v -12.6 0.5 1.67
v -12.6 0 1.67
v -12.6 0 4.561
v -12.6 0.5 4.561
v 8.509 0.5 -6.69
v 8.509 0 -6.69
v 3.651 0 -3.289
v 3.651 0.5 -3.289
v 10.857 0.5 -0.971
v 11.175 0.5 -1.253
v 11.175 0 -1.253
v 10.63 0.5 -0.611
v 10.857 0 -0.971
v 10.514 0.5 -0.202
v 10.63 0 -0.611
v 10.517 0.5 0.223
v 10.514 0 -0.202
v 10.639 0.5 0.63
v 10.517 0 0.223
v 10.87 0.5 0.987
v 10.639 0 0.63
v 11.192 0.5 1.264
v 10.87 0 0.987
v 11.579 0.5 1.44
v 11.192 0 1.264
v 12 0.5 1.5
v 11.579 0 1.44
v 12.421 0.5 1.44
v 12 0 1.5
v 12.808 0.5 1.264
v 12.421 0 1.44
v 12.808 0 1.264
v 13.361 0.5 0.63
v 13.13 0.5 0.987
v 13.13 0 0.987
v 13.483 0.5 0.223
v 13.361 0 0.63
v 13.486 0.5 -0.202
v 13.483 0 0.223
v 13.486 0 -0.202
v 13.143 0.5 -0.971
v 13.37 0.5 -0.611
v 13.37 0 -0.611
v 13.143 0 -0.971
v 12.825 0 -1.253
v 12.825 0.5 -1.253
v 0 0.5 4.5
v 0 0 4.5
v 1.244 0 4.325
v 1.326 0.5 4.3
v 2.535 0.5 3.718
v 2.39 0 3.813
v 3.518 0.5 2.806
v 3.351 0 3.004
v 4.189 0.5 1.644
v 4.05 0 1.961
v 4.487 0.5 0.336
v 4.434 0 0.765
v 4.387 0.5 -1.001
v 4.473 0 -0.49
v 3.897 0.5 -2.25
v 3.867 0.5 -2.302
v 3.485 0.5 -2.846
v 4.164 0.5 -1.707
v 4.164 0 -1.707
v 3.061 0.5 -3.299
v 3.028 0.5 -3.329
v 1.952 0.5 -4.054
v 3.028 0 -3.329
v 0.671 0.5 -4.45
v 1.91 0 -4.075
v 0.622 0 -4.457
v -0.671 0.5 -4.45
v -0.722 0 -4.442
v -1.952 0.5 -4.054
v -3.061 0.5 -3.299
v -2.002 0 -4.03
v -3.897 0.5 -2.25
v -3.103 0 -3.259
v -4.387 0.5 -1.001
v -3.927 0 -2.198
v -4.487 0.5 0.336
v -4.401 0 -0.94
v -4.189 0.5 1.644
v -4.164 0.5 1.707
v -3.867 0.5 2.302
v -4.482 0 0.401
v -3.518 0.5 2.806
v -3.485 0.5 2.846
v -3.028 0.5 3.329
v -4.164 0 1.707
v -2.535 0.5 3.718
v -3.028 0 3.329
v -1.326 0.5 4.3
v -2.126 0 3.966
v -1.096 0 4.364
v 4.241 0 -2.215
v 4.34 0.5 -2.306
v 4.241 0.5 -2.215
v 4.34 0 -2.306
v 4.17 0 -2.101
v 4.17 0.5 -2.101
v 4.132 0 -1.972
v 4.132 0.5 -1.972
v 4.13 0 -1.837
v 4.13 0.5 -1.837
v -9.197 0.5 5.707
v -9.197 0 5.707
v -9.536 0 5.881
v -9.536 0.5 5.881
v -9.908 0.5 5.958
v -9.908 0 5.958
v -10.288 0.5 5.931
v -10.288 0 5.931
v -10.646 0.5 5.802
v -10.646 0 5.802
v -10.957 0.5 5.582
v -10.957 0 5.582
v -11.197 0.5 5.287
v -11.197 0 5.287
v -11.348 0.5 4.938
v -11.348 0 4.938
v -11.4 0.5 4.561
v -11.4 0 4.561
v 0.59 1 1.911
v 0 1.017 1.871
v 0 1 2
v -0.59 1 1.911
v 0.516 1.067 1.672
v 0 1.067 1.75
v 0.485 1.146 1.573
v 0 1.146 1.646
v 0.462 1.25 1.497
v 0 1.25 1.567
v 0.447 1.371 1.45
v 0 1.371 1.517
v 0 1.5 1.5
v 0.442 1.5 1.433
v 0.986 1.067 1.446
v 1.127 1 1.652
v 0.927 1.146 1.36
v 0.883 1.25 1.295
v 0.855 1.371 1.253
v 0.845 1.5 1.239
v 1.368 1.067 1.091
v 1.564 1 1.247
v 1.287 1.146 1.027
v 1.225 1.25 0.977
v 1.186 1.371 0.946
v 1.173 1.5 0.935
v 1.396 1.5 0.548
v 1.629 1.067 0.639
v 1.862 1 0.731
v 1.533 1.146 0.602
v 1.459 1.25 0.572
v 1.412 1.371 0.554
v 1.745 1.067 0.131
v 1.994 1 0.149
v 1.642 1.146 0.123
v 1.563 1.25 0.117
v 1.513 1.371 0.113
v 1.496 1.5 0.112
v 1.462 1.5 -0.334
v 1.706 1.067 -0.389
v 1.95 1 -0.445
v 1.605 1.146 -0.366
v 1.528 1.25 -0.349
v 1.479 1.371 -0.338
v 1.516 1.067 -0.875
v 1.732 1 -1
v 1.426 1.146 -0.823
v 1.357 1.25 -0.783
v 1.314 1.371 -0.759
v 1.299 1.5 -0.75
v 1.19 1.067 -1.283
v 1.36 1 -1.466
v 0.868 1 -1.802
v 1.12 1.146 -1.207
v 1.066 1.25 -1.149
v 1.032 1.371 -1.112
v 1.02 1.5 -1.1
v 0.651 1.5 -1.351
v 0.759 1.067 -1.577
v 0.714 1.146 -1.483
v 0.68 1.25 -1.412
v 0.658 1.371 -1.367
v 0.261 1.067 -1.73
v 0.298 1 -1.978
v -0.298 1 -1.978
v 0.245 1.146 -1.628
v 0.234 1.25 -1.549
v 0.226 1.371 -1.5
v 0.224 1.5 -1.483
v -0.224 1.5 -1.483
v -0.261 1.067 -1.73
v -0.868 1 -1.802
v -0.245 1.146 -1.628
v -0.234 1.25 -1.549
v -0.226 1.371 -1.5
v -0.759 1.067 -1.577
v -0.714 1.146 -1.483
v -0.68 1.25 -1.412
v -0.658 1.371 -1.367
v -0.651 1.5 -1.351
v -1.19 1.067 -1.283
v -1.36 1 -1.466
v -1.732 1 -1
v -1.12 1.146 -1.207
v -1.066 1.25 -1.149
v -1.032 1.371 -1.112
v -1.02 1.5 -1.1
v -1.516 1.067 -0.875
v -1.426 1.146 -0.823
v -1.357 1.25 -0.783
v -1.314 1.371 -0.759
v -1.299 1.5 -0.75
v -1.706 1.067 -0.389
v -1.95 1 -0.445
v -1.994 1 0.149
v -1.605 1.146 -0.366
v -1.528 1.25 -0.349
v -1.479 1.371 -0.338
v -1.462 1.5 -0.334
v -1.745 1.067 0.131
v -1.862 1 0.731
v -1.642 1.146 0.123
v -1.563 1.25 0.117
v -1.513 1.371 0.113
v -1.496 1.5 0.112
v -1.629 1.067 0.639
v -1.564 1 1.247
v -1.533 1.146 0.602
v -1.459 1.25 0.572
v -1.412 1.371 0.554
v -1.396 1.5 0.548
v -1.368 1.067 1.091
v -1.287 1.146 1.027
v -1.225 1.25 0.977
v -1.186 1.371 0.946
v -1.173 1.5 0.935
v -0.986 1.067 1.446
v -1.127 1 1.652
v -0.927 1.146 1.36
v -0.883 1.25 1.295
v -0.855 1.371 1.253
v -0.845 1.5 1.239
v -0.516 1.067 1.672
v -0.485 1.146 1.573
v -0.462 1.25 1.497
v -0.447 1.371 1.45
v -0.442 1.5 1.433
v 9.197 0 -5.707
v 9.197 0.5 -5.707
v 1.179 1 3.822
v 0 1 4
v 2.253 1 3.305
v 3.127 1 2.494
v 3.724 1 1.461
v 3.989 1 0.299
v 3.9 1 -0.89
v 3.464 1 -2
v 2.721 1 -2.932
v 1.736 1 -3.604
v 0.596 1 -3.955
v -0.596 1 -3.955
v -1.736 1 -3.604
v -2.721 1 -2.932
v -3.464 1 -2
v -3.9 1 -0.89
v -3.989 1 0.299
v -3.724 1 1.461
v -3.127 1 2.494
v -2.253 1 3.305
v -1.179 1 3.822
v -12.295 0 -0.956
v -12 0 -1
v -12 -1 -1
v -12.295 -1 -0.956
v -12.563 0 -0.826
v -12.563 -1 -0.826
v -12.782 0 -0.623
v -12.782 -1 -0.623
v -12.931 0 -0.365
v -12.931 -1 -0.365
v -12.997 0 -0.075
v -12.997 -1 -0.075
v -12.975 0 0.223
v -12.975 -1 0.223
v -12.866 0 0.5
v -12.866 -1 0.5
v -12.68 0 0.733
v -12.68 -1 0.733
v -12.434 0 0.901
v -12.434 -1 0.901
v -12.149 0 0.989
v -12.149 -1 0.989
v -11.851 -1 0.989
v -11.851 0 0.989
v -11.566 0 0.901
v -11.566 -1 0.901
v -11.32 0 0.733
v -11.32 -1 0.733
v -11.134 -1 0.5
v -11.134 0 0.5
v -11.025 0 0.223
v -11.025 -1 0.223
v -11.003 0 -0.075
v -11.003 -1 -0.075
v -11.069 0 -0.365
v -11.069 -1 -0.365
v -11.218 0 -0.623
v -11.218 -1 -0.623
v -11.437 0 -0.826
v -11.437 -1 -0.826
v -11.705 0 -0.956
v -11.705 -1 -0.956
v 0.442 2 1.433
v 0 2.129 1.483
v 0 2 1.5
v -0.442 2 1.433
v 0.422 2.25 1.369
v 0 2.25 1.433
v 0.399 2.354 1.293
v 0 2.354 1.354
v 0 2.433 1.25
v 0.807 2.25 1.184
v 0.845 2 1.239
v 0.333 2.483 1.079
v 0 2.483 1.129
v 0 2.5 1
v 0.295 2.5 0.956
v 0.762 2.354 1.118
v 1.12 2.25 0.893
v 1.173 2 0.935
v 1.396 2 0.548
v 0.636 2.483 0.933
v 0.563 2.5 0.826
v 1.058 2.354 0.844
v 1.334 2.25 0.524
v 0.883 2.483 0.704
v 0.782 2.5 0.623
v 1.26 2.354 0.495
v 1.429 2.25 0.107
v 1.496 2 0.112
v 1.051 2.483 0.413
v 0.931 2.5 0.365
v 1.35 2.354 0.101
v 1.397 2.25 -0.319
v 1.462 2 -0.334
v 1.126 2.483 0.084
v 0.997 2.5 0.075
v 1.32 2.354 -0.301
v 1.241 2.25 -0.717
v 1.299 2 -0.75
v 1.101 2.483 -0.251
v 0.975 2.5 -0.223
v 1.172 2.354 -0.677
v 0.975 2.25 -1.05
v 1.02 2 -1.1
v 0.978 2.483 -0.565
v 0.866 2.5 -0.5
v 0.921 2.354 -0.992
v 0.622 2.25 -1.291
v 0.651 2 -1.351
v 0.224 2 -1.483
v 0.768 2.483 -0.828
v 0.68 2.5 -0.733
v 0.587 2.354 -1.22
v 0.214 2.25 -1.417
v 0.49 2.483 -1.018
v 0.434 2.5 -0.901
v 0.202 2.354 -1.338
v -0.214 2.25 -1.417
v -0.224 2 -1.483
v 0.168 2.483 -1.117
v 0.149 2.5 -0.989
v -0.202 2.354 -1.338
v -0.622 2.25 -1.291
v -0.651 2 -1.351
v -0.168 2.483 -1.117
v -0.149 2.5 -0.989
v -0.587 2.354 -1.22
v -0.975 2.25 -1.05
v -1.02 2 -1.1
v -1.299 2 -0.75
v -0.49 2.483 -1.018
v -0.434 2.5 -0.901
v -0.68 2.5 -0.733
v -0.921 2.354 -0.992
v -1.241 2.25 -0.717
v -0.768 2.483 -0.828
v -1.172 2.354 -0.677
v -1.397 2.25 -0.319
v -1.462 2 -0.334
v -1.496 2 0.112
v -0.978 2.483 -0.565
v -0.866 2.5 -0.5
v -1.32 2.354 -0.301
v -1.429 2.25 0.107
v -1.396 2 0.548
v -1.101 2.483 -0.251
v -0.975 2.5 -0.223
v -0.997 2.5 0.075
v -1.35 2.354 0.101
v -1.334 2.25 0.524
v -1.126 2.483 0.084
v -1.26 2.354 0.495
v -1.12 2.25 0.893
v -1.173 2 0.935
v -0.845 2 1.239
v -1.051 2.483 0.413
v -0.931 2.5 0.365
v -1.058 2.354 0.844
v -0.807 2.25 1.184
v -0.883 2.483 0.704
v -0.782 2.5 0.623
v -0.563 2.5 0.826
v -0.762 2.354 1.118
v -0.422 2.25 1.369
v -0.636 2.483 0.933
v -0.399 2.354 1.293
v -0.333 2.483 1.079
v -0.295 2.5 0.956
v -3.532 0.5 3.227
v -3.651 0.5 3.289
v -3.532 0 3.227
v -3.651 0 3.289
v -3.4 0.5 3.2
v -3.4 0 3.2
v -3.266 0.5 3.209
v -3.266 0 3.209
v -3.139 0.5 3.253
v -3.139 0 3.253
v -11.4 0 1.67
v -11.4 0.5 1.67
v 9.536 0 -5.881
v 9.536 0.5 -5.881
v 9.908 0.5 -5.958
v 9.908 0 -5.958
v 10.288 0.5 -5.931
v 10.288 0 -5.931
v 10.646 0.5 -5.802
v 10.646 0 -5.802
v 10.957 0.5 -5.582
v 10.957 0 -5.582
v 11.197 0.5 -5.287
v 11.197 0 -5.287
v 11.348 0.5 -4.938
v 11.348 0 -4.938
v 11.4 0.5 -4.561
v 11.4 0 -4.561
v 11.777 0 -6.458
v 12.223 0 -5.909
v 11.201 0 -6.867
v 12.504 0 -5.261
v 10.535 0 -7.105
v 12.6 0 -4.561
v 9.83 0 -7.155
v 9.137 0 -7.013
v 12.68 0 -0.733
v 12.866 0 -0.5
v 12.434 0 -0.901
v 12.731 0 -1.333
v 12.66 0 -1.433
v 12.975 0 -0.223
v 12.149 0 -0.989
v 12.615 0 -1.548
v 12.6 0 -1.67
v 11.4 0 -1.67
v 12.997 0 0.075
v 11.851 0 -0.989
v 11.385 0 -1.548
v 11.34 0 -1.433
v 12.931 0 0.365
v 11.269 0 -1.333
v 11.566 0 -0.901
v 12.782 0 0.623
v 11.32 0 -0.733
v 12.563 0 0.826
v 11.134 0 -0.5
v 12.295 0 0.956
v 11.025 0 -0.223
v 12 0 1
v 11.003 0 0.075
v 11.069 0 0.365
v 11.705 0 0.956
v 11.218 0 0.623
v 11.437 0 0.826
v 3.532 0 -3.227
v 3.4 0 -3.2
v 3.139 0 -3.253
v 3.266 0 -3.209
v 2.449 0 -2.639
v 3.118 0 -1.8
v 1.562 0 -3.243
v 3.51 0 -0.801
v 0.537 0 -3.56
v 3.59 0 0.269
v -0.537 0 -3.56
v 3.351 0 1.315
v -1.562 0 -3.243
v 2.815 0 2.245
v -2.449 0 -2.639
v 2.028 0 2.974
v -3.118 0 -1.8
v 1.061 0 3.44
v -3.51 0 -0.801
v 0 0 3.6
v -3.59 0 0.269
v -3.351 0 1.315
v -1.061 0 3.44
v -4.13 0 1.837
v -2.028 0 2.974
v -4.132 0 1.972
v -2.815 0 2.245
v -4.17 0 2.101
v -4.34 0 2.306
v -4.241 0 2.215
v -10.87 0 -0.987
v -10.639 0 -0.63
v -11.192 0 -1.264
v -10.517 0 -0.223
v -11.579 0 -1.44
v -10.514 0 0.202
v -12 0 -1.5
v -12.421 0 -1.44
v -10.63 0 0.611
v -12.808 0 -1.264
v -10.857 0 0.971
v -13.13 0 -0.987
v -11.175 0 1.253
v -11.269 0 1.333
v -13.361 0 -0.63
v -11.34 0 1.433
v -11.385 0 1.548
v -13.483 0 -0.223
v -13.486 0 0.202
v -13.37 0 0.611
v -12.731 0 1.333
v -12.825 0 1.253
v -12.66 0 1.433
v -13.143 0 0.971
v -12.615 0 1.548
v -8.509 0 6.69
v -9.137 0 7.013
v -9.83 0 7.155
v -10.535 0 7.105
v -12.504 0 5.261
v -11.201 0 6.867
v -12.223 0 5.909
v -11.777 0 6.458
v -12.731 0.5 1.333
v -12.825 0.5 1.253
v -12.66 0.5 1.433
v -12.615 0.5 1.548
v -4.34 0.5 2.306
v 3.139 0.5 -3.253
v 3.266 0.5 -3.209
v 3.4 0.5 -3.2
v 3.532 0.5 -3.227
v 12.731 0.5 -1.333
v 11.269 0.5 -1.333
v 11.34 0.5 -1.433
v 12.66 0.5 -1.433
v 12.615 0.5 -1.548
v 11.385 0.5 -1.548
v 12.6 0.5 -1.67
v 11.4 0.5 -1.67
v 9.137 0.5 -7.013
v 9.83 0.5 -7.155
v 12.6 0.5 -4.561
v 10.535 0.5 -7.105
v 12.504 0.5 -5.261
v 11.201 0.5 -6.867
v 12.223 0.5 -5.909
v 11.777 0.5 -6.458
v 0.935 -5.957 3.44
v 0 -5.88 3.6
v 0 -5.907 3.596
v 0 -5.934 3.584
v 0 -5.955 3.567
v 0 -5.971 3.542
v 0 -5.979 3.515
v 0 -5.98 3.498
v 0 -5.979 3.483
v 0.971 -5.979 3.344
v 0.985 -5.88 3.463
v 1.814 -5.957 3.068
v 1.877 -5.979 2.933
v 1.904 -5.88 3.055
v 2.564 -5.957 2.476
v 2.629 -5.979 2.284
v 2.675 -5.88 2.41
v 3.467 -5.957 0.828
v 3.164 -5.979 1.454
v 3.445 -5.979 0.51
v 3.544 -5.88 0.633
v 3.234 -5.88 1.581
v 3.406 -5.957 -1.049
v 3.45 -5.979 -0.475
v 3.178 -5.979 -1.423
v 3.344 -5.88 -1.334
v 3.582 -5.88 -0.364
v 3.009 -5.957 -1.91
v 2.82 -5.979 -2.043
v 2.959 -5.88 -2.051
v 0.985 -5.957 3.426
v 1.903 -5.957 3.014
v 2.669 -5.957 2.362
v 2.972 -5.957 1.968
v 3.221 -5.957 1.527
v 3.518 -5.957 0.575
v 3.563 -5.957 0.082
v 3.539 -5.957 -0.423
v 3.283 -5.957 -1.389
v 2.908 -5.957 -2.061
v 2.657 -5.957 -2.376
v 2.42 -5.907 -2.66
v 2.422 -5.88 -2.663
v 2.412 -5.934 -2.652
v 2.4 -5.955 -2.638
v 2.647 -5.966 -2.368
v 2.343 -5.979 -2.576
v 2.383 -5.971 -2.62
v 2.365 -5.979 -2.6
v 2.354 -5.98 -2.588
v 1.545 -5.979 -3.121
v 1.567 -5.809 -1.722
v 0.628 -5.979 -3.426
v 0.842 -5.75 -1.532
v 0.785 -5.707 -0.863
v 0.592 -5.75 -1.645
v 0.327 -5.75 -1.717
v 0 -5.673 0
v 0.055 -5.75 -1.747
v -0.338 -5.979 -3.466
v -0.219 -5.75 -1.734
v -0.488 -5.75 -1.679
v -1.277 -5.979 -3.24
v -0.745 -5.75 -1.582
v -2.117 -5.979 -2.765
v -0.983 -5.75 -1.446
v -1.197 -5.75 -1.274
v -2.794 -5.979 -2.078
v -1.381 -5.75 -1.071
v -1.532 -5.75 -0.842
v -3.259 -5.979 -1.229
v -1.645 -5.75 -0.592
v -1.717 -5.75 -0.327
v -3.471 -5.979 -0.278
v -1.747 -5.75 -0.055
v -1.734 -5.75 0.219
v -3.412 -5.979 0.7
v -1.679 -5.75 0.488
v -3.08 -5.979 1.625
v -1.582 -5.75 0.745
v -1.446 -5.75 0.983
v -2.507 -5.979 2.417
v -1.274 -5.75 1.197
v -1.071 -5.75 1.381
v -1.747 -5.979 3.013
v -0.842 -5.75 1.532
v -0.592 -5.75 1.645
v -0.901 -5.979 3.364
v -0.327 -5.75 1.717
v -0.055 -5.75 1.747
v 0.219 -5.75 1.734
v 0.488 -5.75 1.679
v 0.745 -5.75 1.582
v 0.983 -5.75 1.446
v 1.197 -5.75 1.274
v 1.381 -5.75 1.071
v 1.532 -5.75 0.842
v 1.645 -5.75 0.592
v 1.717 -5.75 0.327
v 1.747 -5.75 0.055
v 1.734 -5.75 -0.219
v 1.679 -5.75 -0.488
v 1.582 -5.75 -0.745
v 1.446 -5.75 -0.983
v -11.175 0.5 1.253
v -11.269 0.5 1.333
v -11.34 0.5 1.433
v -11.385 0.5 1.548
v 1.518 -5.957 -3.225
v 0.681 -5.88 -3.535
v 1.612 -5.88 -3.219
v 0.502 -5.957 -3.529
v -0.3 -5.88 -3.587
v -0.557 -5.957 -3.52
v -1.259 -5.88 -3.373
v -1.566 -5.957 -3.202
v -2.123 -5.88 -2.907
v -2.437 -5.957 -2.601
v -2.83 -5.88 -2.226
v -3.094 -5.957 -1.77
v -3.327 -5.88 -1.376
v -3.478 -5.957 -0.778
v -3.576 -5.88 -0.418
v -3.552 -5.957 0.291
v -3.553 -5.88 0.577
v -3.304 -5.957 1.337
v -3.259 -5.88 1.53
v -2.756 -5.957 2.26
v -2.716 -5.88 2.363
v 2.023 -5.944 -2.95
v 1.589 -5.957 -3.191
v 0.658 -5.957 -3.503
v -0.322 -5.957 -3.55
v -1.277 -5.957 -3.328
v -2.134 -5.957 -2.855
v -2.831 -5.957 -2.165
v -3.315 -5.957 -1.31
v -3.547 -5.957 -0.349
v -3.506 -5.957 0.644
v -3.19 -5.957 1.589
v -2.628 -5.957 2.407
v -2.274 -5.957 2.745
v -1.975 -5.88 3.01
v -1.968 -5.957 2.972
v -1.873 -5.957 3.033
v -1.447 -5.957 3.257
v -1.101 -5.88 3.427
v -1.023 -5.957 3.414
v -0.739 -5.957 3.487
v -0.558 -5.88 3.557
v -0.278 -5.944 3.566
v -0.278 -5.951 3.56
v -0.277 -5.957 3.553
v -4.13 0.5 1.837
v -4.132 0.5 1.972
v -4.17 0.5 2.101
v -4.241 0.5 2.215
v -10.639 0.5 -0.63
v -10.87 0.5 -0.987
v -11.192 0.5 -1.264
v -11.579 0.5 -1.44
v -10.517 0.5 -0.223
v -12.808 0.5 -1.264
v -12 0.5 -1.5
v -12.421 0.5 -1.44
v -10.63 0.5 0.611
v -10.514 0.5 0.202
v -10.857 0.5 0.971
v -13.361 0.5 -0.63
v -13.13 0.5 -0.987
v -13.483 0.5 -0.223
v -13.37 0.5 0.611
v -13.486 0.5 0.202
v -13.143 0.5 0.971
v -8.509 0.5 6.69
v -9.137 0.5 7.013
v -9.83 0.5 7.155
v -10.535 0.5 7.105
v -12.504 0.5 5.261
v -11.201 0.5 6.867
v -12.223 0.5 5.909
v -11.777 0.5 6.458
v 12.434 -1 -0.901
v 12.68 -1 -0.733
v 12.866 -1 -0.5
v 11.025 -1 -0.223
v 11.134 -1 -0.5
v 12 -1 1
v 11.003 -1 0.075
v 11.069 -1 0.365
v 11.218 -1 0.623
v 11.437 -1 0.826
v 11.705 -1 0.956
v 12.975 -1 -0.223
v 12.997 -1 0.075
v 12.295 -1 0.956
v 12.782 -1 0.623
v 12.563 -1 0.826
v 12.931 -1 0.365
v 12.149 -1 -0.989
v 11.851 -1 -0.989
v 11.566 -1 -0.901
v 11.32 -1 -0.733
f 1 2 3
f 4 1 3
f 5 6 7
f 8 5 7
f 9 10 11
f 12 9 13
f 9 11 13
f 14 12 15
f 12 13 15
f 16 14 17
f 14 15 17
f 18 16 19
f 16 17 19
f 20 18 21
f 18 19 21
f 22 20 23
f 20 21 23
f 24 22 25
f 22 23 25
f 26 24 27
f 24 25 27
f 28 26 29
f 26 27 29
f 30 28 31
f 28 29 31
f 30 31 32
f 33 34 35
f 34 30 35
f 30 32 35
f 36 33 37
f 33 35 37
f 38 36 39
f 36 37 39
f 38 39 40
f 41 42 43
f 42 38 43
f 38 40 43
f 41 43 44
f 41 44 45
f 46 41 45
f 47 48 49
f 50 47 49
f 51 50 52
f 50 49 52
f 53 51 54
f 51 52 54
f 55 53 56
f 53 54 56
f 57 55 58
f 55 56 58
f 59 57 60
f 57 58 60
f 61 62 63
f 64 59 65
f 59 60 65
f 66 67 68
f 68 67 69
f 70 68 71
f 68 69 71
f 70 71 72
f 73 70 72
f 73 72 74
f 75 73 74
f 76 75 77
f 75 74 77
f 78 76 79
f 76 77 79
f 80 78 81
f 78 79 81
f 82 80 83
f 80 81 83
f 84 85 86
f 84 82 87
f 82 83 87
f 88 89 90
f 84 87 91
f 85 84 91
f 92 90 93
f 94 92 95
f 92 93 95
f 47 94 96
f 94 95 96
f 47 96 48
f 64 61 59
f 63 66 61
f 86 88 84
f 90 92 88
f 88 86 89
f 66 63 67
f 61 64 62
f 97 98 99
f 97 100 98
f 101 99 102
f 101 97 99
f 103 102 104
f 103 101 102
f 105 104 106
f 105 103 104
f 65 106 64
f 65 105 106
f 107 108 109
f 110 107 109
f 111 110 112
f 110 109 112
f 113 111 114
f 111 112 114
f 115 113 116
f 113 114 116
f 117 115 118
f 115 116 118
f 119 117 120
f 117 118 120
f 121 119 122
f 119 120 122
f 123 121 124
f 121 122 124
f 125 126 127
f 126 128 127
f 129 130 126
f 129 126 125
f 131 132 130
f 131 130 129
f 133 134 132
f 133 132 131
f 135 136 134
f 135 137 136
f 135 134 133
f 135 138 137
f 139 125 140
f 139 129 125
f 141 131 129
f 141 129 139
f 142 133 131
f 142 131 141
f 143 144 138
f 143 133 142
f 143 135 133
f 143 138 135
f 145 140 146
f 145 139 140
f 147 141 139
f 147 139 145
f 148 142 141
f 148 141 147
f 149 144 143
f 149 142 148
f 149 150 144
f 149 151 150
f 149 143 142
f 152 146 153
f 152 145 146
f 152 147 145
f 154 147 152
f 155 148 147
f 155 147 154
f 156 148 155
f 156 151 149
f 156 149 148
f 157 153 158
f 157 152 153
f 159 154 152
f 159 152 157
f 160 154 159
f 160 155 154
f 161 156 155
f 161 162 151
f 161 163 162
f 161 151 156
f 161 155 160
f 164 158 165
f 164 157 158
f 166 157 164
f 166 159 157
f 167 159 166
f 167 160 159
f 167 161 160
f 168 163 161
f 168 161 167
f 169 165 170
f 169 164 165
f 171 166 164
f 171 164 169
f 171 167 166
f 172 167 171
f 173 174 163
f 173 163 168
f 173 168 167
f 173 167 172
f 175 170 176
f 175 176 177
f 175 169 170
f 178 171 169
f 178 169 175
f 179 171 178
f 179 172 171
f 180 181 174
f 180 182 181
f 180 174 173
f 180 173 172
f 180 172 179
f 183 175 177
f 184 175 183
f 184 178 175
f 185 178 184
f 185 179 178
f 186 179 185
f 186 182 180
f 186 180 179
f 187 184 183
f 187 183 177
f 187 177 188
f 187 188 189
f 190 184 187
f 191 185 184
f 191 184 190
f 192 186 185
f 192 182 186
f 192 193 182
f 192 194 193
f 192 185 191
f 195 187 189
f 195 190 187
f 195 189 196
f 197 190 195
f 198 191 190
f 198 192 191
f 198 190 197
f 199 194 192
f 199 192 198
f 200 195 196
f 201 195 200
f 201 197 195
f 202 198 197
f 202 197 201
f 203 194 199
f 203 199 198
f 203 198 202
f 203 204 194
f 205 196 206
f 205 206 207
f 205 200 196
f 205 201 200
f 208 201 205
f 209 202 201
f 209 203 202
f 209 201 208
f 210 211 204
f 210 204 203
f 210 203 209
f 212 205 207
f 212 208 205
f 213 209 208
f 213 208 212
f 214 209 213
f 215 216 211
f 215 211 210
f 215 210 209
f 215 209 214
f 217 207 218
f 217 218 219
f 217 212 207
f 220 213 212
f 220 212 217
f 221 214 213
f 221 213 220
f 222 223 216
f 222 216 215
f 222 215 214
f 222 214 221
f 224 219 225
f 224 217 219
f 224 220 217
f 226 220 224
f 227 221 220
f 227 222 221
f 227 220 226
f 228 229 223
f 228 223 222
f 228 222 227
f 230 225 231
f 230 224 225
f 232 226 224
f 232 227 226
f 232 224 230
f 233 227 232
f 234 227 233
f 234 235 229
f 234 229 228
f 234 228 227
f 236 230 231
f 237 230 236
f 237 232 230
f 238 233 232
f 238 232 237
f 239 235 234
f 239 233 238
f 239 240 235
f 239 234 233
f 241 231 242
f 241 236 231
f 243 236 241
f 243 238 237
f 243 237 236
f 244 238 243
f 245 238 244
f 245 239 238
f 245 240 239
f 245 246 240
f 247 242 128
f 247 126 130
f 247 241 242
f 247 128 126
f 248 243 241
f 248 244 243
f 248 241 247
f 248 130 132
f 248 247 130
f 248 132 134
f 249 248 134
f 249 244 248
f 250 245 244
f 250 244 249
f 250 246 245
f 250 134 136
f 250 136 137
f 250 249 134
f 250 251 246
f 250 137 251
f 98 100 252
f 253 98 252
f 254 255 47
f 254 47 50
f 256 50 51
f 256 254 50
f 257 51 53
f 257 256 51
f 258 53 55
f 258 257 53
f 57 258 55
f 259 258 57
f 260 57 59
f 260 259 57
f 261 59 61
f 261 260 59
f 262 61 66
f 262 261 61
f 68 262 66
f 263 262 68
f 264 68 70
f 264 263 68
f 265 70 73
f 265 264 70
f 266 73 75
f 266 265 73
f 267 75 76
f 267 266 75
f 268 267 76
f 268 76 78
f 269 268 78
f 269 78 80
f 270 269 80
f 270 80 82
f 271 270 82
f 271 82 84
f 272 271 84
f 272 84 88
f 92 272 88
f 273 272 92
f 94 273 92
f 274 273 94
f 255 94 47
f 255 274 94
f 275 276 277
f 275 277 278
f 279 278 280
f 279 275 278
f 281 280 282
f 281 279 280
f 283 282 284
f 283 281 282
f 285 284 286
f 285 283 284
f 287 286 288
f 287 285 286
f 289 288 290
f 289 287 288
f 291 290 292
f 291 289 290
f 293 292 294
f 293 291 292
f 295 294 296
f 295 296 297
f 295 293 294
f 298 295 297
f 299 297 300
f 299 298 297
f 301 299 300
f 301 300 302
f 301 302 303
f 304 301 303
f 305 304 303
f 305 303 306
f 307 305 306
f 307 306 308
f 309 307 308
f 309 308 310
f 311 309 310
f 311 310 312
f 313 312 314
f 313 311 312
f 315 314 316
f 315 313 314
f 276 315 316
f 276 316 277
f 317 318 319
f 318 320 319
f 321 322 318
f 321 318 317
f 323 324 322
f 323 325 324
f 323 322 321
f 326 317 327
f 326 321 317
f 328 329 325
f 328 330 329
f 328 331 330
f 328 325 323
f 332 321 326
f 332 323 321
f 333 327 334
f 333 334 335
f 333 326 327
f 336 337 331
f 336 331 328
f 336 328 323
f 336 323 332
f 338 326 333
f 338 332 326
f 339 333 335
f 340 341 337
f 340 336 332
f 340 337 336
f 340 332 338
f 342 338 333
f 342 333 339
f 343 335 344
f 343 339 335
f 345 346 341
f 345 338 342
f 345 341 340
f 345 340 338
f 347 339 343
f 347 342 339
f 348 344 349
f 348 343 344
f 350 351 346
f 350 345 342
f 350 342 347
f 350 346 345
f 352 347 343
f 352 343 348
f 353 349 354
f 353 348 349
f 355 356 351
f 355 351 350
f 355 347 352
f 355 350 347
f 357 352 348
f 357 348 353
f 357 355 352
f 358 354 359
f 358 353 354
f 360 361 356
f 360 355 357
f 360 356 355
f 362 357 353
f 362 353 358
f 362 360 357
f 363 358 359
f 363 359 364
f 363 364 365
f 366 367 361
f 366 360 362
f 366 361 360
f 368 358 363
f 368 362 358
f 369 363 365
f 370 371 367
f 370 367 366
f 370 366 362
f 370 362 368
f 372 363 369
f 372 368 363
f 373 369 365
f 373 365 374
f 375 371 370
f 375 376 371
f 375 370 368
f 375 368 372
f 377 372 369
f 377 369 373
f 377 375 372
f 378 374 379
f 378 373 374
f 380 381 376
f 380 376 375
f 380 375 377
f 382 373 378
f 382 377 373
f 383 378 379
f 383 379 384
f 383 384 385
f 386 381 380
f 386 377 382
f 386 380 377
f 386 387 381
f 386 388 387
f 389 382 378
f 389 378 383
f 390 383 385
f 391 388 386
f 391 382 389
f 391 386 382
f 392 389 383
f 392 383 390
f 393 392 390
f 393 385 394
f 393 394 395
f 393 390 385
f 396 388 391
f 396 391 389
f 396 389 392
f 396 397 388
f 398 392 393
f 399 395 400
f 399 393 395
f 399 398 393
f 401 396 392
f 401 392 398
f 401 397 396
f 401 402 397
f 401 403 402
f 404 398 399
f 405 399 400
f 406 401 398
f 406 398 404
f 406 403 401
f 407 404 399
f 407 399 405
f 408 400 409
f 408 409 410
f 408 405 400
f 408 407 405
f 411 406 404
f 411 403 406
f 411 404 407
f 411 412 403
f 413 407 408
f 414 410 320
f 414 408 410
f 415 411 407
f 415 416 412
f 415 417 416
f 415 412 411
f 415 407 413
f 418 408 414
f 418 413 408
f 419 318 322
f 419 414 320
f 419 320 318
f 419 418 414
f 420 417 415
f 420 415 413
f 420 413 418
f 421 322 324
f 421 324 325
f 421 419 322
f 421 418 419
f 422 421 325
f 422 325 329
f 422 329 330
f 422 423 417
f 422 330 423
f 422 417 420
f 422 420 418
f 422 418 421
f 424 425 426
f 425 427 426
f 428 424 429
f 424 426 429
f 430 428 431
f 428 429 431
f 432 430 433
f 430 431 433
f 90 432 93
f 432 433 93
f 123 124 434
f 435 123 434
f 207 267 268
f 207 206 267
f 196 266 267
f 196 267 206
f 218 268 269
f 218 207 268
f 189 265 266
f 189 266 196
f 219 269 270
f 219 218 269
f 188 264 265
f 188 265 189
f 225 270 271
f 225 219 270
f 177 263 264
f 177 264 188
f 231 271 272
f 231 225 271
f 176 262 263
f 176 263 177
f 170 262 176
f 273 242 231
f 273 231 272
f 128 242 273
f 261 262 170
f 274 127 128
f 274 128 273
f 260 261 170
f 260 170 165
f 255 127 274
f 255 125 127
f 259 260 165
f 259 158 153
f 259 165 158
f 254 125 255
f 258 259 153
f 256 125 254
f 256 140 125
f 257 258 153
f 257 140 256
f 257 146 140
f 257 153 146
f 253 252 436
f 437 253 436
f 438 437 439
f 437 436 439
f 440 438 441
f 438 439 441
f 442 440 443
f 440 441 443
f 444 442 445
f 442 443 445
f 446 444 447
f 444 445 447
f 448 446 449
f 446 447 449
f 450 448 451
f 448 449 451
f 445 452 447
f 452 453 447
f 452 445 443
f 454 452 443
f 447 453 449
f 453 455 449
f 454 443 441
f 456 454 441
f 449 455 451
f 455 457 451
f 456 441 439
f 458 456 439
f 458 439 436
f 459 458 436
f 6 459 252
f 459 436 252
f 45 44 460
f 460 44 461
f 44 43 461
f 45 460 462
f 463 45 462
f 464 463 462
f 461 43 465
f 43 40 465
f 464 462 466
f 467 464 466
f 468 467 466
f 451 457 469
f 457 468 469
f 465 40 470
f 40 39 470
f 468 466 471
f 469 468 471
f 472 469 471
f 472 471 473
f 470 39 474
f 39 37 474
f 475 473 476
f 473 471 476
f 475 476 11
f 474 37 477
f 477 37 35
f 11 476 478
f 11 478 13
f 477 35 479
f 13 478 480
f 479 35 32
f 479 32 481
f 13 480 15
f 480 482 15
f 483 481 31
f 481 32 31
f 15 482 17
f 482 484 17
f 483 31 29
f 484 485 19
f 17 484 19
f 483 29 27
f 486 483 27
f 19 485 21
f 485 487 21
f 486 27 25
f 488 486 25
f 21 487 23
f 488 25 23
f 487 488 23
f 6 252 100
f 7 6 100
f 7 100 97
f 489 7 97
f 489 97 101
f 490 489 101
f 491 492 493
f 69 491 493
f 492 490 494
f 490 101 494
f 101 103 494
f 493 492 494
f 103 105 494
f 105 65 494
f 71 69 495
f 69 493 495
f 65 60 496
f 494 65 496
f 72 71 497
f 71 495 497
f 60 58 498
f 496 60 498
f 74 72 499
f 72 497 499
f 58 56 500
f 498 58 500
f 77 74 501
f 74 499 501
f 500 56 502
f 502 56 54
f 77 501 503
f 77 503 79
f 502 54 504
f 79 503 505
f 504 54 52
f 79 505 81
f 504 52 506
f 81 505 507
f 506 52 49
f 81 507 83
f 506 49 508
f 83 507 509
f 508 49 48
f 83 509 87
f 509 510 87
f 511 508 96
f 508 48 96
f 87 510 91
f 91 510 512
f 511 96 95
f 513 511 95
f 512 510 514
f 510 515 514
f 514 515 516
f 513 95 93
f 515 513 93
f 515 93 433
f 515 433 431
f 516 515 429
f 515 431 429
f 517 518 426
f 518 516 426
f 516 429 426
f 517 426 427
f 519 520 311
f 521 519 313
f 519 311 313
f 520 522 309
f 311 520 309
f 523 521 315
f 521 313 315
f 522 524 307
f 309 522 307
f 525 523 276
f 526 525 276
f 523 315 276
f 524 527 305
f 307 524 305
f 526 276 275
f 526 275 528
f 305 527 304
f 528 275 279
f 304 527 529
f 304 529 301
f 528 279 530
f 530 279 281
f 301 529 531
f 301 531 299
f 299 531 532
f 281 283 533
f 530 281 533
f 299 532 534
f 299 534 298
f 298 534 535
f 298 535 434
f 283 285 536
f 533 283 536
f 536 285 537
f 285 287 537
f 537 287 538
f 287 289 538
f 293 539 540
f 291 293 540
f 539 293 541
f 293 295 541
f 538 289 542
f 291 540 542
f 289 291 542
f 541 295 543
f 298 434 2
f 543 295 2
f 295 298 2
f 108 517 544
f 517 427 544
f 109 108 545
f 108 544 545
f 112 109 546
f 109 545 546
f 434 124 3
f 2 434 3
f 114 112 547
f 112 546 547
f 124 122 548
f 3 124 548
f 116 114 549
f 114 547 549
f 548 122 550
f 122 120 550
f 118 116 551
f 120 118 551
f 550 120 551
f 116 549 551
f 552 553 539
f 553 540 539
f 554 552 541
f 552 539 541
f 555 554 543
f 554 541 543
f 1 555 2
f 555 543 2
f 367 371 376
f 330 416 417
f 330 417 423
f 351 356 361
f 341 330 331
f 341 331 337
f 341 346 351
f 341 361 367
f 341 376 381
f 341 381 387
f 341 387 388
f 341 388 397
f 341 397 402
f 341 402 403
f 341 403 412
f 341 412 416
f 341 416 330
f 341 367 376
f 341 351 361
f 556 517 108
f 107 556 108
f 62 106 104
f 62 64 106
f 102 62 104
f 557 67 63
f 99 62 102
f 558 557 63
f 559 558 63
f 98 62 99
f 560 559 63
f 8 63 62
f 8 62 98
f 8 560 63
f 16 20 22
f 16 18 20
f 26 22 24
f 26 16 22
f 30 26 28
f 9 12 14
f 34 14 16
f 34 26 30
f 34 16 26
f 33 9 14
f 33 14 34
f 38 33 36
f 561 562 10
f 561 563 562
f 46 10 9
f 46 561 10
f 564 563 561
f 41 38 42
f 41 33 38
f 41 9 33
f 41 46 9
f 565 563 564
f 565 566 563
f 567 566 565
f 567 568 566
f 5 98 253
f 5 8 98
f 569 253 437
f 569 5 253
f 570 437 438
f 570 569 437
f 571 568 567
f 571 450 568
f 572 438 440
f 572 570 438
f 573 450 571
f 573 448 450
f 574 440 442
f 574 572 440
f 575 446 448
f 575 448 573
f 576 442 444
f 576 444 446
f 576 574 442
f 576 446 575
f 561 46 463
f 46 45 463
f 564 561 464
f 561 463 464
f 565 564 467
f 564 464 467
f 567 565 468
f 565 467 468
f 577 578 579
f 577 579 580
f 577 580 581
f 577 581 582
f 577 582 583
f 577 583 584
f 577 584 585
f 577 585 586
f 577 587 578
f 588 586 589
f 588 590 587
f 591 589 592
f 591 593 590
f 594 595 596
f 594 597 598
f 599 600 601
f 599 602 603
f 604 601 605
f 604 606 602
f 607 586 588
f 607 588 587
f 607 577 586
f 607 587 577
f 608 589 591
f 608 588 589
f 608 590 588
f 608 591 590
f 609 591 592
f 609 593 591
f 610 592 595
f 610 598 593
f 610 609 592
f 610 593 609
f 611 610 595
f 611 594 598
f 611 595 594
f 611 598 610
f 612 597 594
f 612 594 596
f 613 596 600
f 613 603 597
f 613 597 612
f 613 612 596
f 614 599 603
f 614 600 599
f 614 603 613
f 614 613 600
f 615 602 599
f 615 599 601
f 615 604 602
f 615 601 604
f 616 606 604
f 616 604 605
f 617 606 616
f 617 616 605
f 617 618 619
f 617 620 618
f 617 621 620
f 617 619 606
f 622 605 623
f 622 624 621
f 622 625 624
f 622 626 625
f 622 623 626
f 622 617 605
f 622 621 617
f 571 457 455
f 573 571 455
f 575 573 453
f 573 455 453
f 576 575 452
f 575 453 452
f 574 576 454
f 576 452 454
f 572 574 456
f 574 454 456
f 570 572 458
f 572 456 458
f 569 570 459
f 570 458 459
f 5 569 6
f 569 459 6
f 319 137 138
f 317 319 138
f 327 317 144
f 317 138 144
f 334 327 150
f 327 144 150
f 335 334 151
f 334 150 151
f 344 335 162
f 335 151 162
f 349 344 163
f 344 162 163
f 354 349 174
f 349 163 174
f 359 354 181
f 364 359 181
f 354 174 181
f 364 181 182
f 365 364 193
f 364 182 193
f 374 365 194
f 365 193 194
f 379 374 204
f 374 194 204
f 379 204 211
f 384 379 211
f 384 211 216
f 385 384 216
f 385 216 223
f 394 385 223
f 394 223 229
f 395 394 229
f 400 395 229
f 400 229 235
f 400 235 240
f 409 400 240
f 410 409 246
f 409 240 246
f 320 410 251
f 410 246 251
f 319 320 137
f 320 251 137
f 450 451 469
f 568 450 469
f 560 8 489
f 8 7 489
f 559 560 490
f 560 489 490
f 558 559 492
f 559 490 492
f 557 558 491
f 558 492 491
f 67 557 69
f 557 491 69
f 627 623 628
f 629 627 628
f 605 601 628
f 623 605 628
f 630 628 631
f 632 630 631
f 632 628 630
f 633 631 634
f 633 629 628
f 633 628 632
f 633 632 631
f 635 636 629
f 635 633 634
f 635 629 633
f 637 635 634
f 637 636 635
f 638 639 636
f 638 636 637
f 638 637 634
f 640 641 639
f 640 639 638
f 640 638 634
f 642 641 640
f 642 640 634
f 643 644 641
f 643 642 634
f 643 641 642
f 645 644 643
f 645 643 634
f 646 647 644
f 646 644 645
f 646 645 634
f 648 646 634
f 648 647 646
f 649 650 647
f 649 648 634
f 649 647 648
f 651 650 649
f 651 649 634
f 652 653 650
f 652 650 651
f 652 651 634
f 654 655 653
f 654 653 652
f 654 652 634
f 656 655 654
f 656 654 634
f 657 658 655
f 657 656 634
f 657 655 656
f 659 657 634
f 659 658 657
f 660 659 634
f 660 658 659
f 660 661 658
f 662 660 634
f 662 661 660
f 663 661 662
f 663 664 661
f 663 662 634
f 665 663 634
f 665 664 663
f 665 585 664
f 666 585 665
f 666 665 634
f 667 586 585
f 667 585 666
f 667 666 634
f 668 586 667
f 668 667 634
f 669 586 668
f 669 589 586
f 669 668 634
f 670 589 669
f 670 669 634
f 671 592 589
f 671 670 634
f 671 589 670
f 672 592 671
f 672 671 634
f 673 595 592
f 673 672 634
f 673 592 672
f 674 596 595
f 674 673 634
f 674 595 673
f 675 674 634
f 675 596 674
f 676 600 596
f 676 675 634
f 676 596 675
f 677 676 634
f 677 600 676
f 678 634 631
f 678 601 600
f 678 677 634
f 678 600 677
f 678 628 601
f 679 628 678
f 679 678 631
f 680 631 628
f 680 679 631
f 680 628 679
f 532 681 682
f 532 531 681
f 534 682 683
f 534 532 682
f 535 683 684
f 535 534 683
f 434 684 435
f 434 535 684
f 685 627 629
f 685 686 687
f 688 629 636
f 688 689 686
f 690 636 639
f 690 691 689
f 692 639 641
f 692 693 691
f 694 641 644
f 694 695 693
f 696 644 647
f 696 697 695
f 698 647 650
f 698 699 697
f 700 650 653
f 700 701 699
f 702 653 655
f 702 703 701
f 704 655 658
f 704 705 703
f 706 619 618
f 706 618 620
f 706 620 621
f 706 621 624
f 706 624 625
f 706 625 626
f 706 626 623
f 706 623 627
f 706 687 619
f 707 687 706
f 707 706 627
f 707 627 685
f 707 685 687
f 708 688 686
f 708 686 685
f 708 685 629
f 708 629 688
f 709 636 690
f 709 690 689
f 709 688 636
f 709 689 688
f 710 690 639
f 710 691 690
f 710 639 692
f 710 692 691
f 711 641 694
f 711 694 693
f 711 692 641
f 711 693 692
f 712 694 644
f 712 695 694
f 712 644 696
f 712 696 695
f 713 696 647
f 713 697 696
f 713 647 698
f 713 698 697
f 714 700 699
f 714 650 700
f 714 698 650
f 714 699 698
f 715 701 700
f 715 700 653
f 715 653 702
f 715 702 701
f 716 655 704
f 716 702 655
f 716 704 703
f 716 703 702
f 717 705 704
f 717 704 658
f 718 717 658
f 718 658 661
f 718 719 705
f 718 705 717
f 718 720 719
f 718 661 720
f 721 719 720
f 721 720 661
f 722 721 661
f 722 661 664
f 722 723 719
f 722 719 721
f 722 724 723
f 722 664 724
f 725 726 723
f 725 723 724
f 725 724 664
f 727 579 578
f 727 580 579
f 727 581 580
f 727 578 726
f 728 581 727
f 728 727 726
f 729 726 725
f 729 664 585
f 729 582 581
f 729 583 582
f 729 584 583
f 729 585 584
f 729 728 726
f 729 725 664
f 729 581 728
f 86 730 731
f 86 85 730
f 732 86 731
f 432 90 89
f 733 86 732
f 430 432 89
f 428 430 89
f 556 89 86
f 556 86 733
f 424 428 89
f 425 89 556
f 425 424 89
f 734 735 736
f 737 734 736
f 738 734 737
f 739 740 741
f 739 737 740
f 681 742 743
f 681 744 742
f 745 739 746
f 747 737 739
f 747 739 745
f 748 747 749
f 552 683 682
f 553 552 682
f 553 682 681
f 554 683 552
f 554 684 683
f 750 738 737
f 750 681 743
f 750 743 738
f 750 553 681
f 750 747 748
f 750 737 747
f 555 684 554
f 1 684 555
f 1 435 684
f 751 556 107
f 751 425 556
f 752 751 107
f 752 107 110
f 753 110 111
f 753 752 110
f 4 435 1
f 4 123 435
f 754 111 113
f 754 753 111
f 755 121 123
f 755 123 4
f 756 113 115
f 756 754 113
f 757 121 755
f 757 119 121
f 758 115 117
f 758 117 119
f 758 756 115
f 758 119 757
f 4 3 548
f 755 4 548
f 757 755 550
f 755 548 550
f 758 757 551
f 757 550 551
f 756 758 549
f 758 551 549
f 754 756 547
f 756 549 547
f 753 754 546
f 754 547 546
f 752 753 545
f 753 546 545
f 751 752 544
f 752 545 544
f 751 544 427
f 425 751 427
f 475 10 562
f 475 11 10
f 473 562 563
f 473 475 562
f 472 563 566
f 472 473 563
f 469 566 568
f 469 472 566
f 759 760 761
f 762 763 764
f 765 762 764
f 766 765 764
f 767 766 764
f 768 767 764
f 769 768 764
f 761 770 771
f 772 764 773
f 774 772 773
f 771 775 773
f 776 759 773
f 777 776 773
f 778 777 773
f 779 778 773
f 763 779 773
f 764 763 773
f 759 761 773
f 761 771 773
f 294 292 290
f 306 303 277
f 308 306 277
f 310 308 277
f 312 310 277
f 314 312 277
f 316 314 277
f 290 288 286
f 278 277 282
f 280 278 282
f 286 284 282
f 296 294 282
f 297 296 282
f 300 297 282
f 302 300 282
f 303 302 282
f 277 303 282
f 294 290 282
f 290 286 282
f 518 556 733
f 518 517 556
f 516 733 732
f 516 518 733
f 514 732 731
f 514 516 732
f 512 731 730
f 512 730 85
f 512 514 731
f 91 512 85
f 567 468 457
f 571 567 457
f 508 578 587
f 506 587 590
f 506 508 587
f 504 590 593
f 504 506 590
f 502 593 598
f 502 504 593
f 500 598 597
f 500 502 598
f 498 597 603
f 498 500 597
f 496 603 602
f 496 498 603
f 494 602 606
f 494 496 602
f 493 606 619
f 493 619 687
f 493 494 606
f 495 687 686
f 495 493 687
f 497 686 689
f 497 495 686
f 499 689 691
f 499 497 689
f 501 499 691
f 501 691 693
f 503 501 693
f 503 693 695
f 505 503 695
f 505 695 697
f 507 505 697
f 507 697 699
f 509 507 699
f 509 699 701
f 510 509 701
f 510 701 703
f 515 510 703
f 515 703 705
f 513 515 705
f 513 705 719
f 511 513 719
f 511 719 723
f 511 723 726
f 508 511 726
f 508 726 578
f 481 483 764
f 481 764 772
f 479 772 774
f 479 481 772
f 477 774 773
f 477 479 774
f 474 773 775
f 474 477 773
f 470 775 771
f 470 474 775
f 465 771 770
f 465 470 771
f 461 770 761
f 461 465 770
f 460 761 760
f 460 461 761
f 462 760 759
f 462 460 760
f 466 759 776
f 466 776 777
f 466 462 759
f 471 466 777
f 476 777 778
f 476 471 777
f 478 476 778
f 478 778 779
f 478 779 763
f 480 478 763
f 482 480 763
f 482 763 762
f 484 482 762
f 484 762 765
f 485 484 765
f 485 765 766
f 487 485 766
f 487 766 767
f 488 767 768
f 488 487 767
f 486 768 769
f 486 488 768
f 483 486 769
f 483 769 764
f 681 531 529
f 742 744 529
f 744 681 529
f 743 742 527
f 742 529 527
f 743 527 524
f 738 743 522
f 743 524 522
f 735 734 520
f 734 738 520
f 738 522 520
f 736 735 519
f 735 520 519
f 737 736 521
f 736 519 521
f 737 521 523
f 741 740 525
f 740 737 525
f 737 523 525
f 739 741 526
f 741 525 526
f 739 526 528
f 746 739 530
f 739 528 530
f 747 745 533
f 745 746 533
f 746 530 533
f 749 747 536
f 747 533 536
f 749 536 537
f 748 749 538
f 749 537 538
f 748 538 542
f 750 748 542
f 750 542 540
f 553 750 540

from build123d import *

# Parameters (mm, degrees)
SKETCH1_R                = 3.6
BOSS_EXTRUDE1_DEPTH      = 6
SKETCH2_R                = 4.5
BOSS_EXTRUDE2_DEPTH      = 1
EXTRUDE_THIN1_DEPTH      = 0.5
SKETCH4_R                = 1.5
BOSS_EXTRUDE3_DEPTH      = 0.5
SKETCH5_R                = 1
BOSS_EXTRUDE4_DEPTH      = 1
FILLET1_R                = 0.5
CIRPATTERN1_COUNT        = 2
FILLET1_OF_CIRPATTERN1_R = 0.5
CHAMFER1_SIZE            = 0.5
SKETCH6_R                = 1.5
BOSS_EXTRUDE5_DEPTH      = 1.5
FILLET2_R                = 0.5
FILLET3_R                = 0.1
FILLET4_R                = 0.5


with BuildPart() as part:
    # Sketch1 → Boss-Extrude1 (new body)
    with BuildSketch(Plane(origin=(0, 0, 0), x_dir=(1, 0, 0), z_dir=(0, 1, 0))):
        with Locations(Location((0, 0, 0), (0, 0, 270))):
            Circle(SKETCH1_R)
    extrude(amount=-BOSS_EXTRUDE1_DEPTH)

    # Sketch2 → Boss-Extrude2 (add)
    with BuildSketch(Plane(origin=(0, 0, 0), x_dir=(1, 0, 0), z_dir=(0, 1, 0))):
        with Locations(Location((0, 0, 0), (0, 0, 270))):
            Circle(SKETCH2_R)
    extrude(amount=BOSS_EXTRUDE2_DEPTH)

    # Sketch3 → Extrude-Thin1 (add)
    with BuildSketch(Plane(origin=(0, 0, 0), x_dir=(1, 0, 0), z_dir=(0, 1, 0))):
        with BuildLine():
            Line((0.344145862, -0.491491227), (9.196992989, 5.707339067))
            ThreePointArc((9.196992989, 5.707339067), (10.646448059, 5.802341371), (11.4, 4.560526205))
            Line((11.4, 4.560526205), (11.4, 0))
            Line((11.4, 0), (12.6, 0))
            Line((12.6, 0), (12.6, 4.560526205))
            ThreePointArc((12.6, 4.560526205), (11.200546394, 6.866754371), (8.508701265, 6.69032152))
            Line((8.508701265, 6.69032152), (-0.344145862, 0.491491227))
            Line((-0.344145862, 0.491491227), (0.344145862, -0.491491227))
        make_face()
    extrude_thin1 = extrude(amount=EXTRUDE_THIN1_DEPTH)

    # Sketch4 → Boss-Extrude3 (add)
    with BuildSketch(Plane(origin=(0, 0, 0), x_dir=(1, 0, 0), z_dir=(0, 1, 0))):
        with Locations((12, 0)):
            Circle(SKETCH4_R)
    boss_extrude3 = extrude(amount=BOSS_EXTRUDE3_DEPTH)

    # Sketch5 → Boss-Extrude4 (add)
    with BuildSketch(Plane(origin=(0, 0, 0), x_dir=(1, 0, 0), z_dir=(0, 1, 0))):
        with Locations(Location((12, 0, 0), (0, 0, 270))):
            Circle(SKETCH5_R)
    boss_extrude4 = extrude(amount=-BOSS_EXTRUDE4_DEPTH)

    # Fillet1
    fillet1_edges = [part.edges().sort_by_distance(p)[0] for p in [
        (3.997417043, 0.25, -2.066556794),
        (3.30912532, 0.25, -3.049539247),
        (11.4, 0.25, -1.374772708),
        (12.6, 0.25, -1.374772708),
    ]]
    fillet(fillet1_edges, radius=FILLET1_R)

    # CirPattern1: Extrude-Thin1, Boss-Extrude3, Boss-Extrude4 ×2 about axis
    cirpattern1_axis = Axis((0, 0, 0), (0, 1, 0))
    add([extrude_thin1.rotate(cirpattern1_axis, i * 360 / CIRPATTERN1_COUNT) for i in range(1, CIRPATTERN1_COUNT)])
    add([boss_extrude3.rotate(cirpattern1_axis, i * 360 / CIRPATTERN1_COUNT) for i in range(1, CIRPATTERN1_COUNT)])
    add([boss_extrude4.rotate(cirpattern1_axis, i * 360 / CIRPATTERN1_COUNT) for i in range(1, CIRPATTERN1_COUNT)])

    # Fillet1 of CirPattern1
    fillet1_of_cirpattern1_edges = [part.edges().sort_by_distance(p)[0] for p in [
        (-3.997417043, 0.25, 2.066556794),
        (-3.30912532, 0.25, 3.049539247),
        (-11.4, 0.25, 1.374772708),
        (-12.6, 0.25, 1.374772708),
    ]]
    fillet(fillet1_of_cirpattern1_edges, radius=FILLET1_OF_CIRPATTERN1_R)

    # Chamfer1
    chamfer1_edges = [part.edges().sort_by_distance(p)[0] for p in [
        (0, 1, -4.5),
    ]]
    chamfer(chamfer1_edges, length=CHAMFER1_SIZE - 0.0001)  # a hair under: the kernel refuses the full size

    # Sketch6 → Boss-Extrude5 (add)
    with BuildSketch(Plane(origin=(0, 1, 0), x_dir=(1, 0, 0), z_dir=(0, 1, 0))):
        with Locations(Location((0, 0, 0), (0, 0, 270))):
            Circle(SKETCH6_R)
    extrude(amount=BOSS_EXTRUDE5_DEPTH)

    # Fillet2
    fillet2_edges = [part.edges().sort_by_distance(p)[0] for p in [
        (0, 2.5, -1.5),
    ]]
    fillet(fillet2_edges, radius=FILLET2_R)

    # Sketch7 → Cut-Revolve1 (revolve, cut)
    with BuildSketch(Plane(origin=(0, 0, 0), x_dir=(0, 0, -1), z_dir=(1, 0, 0)), mode=Mode.PRIVATE) as cut_revolve1_sk:
        with BuildLine():
            Line((0, -6), (0, -5.673332204))
            ThreePointArc((0, -5.673332204), (-1.807395353, -5.755166574), (-3.6, -6))
            Line((-3.6, -6), (0, -6))
        make_face()
    revolve(cut_revolve1_sk.sketch.rotate(Axis((0, -6, 0), (0, 1, 0)), 137.709032994), axis=Axis((0, -6, 0), (0, 1, 0)), mode=Mode.SUBTRACT)

    # Fillet3
    fillet3_edges = [part.edges().sort_by_distance(p)[0] for p in [
        (-3.357602864, -6, -1.298654307),
    ]]
    fillet(fillet3_edges, radius=FILLET3_R)

    # Fillet4
    fillet4_edges = [part.edges().sort_by_distance(p)[0] for p in [
        (0, 1, -1.5),
    ]]
    fillet(fillet4_edges, radius=FILLET4_R)


solid = part.part
